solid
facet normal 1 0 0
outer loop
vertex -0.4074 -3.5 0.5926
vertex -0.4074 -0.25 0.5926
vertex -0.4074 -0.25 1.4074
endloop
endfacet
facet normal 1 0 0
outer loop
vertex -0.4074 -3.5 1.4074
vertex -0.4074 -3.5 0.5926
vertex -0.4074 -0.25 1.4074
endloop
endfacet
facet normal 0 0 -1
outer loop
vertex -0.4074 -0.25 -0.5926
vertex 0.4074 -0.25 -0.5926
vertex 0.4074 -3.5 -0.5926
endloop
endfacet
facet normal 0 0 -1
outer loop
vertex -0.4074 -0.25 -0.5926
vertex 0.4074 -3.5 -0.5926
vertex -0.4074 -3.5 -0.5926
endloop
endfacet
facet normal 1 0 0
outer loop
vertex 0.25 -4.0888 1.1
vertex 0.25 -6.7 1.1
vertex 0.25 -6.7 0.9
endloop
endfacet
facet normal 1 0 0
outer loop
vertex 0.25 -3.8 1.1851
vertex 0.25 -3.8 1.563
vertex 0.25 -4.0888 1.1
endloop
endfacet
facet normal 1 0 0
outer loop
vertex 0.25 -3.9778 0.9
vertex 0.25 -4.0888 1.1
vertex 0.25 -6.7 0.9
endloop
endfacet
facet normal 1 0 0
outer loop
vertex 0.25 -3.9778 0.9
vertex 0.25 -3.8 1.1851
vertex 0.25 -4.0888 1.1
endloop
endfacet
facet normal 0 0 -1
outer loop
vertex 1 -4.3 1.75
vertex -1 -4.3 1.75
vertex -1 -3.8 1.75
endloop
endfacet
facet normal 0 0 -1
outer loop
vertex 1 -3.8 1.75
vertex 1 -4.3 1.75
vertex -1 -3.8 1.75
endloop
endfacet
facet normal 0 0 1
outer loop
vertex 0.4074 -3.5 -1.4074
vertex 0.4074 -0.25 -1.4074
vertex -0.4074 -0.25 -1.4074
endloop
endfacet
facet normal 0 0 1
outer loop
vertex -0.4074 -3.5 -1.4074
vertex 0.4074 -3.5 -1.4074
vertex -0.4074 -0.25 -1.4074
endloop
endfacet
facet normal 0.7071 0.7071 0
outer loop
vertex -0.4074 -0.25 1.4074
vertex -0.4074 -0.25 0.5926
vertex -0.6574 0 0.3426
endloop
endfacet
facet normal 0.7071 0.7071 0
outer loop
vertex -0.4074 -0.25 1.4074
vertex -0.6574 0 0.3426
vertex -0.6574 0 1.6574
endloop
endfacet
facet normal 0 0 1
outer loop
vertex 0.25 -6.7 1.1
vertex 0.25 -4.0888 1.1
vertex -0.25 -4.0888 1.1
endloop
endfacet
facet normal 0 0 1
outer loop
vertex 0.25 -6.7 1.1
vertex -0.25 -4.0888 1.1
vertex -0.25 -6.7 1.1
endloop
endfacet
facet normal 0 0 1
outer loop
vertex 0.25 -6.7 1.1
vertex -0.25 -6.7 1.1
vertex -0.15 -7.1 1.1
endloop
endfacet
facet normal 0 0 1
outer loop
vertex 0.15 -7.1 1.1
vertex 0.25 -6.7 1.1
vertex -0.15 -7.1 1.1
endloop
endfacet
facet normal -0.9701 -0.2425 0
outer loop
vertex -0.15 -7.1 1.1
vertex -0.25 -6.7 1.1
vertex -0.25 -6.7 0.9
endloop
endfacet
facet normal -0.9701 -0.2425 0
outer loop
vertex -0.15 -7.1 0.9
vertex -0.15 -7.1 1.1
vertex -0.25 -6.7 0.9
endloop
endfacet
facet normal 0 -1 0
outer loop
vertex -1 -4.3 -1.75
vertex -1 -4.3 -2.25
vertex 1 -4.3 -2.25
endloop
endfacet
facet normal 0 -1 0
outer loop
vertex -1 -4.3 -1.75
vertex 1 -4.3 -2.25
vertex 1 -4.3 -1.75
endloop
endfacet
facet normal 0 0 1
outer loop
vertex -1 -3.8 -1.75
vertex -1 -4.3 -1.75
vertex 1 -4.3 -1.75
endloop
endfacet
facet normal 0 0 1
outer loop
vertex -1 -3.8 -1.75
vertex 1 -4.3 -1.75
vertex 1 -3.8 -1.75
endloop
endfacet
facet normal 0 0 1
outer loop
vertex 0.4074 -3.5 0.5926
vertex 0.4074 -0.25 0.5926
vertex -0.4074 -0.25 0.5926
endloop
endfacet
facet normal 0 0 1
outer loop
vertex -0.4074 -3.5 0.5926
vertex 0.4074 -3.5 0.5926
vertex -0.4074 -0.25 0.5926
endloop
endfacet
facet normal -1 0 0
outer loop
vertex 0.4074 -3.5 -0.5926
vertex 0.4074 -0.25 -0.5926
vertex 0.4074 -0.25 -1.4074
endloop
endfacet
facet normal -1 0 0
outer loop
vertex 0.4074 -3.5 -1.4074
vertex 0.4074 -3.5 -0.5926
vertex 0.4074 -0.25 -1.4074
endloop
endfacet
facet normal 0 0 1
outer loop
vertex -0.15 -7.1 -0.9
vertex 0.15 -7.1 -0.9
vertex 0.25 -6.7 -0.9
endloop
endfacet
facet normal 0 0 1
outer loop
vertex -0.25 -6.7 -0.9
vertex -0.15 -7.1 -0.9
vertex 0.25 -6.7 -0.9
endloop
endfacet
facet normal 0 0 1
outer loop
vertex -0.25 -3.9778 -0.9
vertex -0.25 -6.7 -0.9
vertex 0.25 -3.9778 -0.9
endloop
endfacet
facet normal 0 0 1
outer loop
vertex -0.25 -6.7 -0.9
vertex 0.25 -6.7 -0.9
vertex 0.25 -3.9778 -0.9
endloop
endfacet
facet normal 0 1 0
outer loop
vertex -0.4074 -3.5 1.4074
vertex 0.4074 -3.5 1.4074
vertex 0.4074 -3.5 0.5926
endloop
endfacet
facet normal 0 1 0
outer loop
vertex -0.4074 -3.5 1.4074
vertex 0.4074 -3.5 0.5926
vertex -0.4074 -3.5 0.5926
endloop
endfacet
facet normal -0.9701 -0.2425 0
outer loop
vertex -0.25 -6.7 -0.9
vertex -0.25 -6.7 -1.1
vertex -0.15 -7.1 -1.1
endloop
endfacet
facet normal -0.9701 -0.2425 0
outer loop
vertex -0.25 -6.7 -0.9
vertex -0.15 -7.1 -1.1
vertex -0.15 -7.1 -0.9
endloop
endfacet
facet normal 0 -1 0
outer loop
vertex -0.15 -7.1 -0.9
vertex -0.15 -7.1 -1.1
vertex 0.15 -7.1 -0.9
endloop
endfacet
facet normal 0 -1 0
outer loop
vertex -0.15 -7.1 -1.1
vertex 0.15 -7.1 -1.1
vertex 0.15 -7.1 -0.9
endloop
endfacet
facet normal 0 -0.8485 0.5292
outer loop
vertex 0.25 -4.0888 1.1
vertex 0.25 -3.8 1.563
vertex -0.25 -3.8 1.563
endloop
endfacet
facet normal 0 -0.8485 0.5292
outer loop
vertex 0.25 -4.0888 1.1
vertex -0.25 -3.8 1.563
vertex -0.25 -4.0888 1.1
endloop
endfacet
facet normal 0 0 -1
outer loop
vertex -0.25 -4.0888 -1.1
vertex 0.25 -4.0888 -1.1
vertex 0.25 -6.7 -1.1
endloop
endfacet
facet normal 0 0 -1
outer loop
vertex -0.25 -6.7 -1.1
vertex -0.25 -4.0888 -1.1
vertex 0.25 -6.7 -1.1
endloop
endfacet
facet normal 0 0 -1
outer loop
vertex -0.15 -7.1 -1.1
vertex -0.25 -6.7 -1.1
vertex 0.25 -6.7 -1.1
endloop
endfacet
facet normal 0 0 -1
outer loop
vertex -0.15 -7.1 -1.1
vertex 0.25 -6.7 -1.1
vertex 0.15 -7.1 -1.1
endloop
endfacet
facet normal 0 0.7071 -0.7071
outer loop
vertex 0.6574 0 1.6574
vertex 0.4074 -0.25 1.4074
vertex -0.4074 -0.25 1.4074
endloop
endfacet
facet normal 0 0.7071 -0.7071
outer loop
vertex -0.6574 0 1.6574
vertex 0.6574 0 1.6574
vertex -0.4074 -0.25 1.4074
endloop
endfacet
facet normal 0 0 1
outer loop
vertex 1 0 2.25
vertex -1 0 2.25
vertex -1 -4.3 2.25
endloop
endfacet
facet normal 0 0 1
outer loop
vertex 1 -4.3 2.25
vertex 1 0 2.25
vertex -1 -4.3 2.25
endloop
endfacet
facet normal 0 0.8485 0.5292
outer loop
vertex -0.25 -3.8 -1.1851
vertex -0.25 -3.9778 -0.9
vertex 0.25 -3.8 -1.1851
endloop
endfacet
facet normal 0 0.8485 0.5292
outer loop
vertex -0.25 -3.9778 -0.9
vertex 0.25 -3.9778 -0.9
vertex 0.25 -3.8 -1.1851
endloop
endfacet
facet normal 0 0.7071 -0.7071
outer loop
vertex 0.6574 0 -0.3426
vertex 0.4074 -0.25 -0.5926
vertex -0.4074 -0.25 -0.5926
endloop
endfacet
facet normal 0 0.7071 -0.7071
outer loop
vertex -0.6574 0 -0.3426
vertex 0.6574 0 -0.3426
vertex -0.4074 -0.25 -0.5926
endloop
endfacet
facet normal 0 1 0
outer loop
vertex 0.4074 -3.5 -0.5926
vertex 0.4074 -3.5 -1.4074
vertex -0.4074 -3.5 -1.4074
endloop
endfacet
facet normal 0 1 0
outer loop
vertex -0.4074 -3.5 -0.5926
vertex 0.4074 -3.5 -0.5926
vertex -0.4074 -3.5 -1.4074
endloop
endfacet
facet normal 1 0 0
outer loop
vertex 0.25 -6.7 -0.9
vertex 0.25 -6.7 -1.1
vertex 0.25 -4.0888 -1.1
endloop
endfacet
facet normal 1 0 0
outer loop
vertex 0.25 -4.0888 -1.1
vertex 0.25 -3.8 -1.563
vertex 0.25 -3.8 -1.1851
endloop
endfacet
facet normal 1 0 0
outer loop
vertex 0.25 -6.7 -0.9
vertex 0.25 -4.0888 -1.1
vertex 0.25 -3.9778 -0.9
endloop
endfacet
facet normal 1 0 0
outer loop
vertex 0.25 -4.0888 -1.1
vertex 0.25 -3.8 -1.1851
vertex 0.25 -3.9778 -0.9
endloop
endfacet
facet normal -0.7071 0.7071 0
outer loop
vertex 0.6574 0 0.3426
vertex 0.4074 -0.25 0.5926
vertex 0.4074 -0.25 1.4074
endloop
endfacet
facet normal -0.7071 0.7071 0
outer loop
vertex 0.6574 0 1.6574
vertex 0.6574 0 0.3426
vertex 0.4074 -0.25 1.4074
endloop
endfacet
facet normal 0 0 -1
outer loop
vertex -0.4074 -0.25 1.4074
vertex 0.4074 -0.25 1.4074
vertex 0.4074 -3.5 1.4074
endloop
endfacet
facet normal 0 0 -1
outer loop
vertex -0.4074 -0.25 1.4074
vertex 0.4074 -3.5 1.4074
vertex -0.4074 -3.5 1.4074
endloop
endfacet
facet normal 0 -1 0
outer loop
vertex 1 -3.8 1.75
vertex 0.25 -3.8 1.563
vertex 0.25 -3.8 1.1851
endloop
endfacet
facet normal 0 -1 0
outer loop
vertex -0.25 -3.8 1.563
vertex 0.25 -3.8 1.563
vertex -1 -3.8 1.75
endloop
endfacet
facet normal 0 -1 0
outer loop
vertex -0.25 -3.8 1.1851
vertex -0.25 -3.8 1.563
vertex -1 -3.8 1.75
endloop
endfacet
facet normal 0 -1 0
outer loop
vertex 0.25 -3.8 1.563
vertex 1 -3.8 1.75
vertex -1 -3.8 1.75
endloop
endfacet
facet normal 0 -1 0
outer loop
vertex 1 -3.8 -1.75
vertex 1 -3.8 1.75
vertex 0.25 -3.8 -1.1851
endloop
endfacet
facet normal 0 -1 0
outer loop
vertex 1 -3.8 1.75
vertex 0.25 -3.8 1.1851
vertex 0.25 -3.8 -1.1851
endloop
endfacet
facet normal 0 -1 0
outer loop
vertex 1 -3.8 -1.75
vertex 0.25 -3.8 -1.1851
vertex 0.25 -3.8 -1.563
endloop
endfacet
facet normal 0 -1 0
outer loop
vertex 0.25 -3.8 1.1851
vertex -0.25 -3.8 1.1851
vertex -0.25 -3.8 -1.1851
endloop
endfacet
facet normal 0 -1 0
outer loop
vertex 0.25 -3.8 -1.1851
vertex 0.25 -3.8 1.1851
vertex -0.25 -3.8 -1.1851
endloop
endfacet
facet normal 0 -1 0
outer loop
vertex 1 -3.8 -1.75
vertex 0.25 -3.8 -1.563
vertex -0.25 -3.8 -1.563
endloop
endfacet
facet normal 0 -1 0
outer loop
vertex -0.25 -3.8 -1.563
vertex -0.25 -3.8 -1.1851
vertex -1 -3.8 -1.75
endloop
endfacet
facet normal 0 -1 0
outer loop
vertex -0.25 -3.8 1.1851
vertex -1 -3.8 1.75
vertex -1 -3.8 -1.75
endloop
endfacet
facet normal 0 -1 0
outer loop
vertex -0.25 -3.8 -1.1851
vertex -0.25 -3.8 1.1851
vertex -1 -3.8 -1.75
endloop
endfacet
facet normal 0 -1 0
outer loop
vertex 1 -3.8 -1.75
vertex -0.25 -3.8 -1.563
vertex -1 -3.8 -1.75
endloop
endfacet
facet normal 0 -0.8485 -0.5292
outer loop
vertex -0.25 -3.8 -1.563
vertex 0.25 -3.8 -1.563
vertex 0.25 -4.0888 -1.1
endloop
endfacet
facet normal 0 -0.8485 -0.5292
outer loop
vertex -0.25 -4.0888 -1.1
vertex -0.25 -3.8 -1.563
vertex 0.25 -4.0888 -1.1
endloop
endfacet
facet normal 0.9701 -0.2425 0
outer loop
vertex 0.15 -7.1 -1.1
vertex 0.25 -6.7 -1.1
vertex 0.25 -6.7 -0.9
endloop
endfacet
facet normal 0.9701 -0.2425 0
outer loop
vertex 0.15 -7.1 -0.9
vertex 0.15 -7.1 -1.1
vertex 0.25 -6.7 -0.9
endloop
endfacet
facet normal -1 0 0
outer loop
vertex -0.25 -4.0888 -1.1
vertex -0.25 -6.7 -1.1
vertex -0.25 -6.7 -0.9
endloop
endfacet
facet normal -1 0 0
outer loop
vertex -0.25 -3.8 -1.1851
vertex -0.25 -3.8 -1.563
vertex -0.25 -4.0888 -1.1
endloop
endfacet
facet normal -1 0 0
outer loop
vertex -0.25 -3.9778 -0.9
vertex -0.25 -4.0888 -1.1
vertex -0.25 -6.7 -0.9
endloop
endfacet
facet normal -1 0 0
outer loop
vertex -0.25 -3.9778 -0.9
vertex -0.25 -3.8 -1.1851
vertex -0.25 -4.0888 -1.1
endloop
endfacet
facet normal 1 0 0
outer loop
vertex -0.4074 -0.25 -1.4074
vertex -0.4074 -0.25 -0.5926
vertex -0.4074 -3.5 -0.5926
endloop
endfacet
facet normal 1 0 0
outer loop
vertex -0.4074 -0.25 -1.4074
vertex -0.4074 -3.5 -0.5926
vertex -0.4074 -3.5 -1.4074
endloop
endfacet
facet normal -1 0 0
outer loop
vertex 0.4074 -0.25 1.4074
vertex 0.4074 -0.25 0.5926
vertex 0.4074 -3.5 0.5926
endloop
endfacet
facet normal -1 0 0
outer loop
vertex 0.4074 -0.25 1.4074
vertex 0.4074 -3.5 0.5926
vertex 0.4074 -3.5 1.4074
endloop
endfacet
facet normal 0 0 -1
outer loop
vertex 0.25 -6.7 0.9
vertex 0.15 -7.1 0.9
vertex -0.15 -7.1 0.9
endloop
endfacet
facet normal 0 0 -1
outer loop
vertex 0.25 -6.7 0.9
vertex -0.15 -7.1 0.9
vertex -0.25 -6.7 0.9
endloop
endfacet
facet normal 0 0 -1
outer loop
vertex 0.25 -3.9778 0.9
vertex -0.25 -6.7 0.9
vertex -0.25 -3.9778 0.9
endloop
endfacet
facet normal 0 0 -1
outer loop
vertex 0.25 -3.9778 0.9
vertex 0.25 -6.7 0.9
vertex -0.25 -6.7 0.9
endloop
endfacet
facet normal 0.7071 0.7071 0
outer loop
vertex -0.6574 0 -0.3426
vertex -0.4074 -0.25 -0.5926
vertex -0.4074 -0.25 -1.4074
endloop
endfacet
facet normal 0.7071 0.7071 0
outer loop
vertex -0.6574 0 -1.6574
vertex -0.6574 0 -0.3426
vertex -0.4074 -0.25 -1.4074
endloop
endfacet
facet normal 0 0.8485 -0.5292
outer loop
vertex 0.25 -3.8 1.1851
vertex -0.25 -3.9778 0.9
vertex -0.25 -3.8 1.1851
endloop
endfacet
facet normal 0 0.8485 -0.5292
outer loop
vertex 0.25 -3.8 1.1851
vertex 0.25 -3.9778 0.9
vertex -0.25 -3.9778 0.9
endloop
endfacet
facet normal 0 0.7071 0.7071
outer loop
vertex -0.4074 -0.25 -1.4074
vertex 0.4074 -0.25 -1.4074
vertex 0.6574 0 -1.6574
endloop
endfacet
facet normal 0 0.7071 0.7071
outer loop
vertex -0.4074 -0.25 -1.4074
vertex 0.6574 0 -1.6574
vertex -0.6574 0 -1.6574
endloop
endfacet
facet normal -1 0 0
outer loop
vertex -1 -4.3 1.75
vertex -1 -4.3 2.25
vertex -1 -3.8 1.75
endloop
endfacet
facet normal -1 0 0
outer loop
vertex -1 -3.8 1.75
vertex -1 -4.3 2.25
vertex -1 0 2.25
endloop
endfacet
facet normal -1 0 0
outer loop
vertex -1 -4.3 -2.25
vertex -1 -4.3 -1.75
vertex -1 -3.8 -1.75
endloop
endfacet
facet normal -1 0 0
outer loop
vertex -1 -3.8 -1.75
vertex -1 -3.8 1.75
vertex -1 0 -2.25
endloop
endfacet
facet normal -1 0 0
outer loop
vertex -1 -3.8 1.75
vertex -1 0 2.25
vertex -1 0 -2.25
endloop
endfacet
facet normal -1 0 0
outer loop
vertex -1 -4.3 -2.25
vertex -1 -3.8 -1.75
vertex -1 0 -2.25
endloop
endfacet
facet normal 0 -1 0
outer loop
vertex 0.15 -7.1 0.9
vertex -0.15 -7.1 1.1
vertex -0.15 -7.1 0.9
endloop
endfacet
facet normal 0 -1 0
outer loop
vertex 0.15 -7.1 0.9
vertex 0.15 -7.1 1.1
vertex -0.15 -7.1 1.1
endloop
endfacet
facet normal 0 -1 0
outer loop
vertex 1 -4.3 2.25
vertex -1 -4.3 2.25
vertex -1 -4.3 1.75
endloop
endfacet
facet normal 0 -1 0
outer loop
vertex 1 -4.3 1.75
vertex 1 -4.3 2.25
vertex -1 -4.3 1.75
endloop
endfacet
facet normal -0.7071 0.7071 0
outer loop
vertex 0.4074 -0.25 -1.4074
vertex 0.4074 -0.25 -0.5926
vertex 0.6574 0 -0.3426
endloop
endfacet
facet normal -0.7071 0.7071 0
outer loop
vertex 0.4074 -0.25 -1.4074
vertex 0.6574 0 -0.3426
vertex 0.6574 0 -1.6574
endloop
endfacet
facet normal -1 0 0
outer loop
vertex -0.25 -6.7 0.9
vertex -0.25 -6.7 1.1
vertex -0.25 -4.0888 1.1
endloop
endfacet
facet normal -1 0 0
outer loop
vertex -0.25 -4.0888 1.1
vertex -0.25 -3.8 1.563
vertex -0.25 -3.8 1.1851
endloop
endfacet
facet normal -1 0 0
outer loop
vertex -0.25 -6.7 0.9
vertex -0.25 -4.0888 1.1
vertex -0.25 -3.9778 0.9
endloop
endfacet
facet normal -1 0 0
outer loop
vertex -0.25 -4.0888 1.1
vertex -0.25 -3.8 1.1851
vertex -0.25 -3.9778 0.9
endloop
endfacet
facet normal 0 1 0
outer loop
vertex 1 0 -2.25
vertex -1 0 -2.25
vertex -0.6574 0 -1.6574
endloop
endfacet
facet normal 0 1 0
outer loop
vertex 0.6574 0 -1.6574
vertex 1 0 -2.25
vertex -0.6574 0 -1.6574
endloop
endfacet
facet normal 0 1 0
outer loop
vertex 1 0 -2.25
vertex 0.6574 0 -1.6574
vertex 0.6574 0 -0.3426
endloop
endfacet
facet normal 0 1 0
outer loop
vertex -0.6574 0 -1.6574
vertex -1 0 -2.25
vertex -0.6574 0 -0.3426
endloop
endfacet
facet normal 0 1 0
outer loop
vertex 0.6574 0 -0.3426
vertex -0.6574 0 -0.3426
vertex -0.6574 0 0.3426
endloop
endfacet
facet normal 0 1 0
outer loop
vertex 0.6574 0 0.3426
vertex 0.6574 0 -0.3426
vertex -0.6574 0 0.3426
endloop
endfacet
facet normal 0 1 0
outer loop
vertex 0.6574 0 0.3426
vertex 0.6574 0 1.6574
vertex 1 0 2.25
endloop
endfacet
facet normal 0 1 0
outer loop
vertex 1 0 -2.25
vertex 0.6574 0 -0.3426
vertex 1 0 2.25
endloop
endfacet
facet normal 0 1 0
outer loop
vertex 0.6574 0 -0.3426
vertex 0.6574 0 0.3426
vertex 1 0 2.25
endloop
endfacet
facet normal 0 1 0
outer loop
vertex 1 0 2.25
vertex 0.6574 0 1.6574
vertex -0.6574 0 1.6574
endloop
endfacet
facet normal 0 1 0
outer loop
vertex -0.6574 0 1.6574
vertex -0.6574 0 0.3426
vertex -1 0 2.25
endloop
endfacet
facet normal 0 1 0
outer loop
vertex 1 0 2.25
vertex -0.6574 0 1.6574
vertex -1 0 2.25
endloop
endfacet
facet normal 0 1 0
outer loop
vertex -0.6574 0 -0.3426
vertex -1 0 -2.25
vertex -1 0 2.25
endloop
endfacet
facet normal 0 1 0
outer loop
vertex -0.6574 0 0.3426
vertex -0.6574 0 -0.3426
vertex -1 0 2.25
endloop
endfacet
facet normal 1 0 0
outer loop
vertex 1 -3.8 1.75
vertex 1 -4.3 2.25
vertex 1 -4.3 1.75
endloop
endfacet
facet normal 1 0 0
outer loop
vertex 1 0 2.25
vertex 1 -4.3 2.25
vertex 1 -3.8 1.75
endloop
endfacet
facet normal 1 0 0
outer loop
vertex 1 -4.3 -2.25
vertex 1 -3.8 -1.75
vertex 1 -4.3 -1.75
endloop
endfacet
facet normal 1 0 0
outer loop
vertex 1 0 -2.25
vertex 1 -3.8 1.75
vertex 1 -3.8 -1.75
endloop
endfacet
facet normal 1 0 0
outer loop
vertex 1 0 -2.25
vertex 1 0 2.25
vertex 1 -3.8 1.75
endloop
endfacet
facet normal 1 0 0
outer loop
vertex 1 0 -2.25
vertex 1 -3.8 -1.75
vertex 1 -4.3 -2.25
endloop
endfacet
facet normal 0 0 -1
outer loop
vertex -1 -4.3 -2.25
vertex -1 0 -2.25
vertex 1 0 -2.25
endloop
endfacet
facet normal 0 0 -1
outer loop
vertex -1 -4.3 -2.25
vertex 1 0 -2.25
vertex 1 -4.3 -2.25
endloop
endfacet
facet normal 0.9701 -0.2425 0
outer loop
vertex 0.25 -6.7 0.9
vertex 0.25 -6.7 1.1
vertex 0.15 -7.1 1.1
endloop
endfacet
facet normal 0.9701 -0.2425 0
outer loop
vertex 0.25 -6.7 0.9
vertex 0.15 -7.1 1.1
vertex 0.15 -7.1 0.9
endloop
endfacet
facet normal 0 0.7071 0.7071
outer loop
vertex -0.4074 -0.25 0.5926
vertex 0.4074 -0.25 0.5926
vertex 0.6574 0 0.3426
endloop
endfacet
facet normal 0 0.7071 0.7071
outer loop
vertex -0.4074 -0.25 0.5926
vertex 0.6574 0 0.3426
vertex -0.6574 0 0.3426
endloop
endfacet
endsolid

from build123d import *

# Parameters (mm, degrees)
EXTRUDE_1_DEPTH            = 1
SKETCH_3_W                 = 0.814720046
SKETCH_3_H                 = 0.814720046
CUT_EXTRUDE_1_DEPTH        = 3.5
CHAMFER_1_SIZE             = 0.25
CHAMFER_1_OF_MIRROR_1_SIZE = 0.25
EXTRUDE_2_DEPTH            = 0.25
CHAMFER_2_SIZE             = 0.1
CHAMFER_2_SIZE2            = 0.4
CUT_EXTRUDE_2_DEPTH        = 8.514818694


with BuildPart() as part:
    # 草图1 → 凸台-拉伸1 (new, symmetric)
    with BuildSketch(Plane(origin=(0, 0, 0), x_dir=(0, 0, -1), z_dir=(1, 0, 0))):
        Polygon((-2.25, 0), (2.25, 0), (2.25, -4.3), (1.75, -4.3), (1.75, -3.8), (-1.75, -3.8), (-1.75, -4.3), (-2.25, -4.3), align=None)
    extrude(amount=EXTRUDE_1_DEPTH, both=True)

    # 草图3 → 切除-拉伸1 (cut)
    with BuildSketch(Plane(origin=(0, 0, 0), x_dir=(1, 0, 0), z_dir=(0, 1, 0))):
        with Locations((0, 1)):
            Rectangle(SKETCH_3_W, SKETCH_3_H)
    cut_extrude_1 = extrude(amount=-CUT_EXTRUDE_1_DEPTH, mode=Mode.SUBTRACT)

    # 倒角1
    chamfer_1_edges = [part.edges().sort_by_distance(p)[0] for p in [
        (-0.407360023, 0, -1),
        (0, 0, -0.592639977),
        (0.407360023, 0, -1),
        (0, 0, -1.407360023),
    ]]
    chamfer(chamfer_1_edges, length=CHAMFER_1_SIZE)

    # 镜向1: 切除-拉伸1 across plane
    add(cut_extrude_1.mirror(Plane.XY), mode=Mode.SUBTRACT)

    # 倒角1 of 镜向1
    chamfer_1_of_mirror_1_edges = [part.edges().sort_by_distance(p)[0] for p in [
        (-0.407360023, 0, 1),
        (0, 0, 0.592639977),
        (0.407360023, 0, 1),
        (0, 0, 1.407360023),
    ]]
    chamfer(chamfer_1_of_mirror_1_edges, length=CHAMFER_1_OF_MIRROR_1_SIZE)

    # 草图4 → 凸台-拉伸2 (add)
    with BuildSketch(Plane(origin=(0, 0, 0), x_dir=(0, 0, -1), z_dir=(1, 0, 0))):
        Polygon((1.562968954, -3.8), (1.1, -4.088782437), (1.1, -7.1), (0.9, -7.1), (0.9, -3.977816442), (1.18507098, -3.8), align=None)
    extrude(amount=EXTRUDE_2_DEPTH)

    # 倒角2
    chamfer_2_edges = [part.edges().sort_by_distance(p)[0] for p in [
        (0.25, -7.1, -1),
    ]]
    chamfer_2_side = [part.faces().sort_by_distance(p)[0] for p in [
        (0.125, -7.1, -1),
    ]]
    chamfer(chamfer_2_edges, length=CHAMFER_2_SIZE, length2=CHAMFER_2_SIZE2, reference=chamfer_2_side[0])

    # 草图5 → 切除-拉伸2 (cut, through all)
    with BuildSketch(Plane(origin=(0, 0, 0), x_dir=(1, 0, 0), z_dir=(0, 1, 0))):
        Polygon((0, 2.25), (-1, 2.25), (-1, -2.25), (1, -2.25), (1, 0), (0, 0), align=None)
    extrude(amount=-CUT_EXTRUDE_2_DEPTH, mode=Mode.SUBTRACT)

    # 镜向3: part across plane


with BuildPart() as part_1:
    add(part.part)
    add(part.part.mirror(Plane(origin=(0, 0, 0), x_dir=(0, 0, 1), z_dir=(1, 0, 0))))

    # 镜向4: part across plane


with BuildPart() as part_2:
    add(part_1.part)
    add(part_1.part.mirror(Plane(origin=(0, -7.1, 0), x_dir=(1, 0, 0), z_dir=(0, 0, -1))))


solid = part_2.part
